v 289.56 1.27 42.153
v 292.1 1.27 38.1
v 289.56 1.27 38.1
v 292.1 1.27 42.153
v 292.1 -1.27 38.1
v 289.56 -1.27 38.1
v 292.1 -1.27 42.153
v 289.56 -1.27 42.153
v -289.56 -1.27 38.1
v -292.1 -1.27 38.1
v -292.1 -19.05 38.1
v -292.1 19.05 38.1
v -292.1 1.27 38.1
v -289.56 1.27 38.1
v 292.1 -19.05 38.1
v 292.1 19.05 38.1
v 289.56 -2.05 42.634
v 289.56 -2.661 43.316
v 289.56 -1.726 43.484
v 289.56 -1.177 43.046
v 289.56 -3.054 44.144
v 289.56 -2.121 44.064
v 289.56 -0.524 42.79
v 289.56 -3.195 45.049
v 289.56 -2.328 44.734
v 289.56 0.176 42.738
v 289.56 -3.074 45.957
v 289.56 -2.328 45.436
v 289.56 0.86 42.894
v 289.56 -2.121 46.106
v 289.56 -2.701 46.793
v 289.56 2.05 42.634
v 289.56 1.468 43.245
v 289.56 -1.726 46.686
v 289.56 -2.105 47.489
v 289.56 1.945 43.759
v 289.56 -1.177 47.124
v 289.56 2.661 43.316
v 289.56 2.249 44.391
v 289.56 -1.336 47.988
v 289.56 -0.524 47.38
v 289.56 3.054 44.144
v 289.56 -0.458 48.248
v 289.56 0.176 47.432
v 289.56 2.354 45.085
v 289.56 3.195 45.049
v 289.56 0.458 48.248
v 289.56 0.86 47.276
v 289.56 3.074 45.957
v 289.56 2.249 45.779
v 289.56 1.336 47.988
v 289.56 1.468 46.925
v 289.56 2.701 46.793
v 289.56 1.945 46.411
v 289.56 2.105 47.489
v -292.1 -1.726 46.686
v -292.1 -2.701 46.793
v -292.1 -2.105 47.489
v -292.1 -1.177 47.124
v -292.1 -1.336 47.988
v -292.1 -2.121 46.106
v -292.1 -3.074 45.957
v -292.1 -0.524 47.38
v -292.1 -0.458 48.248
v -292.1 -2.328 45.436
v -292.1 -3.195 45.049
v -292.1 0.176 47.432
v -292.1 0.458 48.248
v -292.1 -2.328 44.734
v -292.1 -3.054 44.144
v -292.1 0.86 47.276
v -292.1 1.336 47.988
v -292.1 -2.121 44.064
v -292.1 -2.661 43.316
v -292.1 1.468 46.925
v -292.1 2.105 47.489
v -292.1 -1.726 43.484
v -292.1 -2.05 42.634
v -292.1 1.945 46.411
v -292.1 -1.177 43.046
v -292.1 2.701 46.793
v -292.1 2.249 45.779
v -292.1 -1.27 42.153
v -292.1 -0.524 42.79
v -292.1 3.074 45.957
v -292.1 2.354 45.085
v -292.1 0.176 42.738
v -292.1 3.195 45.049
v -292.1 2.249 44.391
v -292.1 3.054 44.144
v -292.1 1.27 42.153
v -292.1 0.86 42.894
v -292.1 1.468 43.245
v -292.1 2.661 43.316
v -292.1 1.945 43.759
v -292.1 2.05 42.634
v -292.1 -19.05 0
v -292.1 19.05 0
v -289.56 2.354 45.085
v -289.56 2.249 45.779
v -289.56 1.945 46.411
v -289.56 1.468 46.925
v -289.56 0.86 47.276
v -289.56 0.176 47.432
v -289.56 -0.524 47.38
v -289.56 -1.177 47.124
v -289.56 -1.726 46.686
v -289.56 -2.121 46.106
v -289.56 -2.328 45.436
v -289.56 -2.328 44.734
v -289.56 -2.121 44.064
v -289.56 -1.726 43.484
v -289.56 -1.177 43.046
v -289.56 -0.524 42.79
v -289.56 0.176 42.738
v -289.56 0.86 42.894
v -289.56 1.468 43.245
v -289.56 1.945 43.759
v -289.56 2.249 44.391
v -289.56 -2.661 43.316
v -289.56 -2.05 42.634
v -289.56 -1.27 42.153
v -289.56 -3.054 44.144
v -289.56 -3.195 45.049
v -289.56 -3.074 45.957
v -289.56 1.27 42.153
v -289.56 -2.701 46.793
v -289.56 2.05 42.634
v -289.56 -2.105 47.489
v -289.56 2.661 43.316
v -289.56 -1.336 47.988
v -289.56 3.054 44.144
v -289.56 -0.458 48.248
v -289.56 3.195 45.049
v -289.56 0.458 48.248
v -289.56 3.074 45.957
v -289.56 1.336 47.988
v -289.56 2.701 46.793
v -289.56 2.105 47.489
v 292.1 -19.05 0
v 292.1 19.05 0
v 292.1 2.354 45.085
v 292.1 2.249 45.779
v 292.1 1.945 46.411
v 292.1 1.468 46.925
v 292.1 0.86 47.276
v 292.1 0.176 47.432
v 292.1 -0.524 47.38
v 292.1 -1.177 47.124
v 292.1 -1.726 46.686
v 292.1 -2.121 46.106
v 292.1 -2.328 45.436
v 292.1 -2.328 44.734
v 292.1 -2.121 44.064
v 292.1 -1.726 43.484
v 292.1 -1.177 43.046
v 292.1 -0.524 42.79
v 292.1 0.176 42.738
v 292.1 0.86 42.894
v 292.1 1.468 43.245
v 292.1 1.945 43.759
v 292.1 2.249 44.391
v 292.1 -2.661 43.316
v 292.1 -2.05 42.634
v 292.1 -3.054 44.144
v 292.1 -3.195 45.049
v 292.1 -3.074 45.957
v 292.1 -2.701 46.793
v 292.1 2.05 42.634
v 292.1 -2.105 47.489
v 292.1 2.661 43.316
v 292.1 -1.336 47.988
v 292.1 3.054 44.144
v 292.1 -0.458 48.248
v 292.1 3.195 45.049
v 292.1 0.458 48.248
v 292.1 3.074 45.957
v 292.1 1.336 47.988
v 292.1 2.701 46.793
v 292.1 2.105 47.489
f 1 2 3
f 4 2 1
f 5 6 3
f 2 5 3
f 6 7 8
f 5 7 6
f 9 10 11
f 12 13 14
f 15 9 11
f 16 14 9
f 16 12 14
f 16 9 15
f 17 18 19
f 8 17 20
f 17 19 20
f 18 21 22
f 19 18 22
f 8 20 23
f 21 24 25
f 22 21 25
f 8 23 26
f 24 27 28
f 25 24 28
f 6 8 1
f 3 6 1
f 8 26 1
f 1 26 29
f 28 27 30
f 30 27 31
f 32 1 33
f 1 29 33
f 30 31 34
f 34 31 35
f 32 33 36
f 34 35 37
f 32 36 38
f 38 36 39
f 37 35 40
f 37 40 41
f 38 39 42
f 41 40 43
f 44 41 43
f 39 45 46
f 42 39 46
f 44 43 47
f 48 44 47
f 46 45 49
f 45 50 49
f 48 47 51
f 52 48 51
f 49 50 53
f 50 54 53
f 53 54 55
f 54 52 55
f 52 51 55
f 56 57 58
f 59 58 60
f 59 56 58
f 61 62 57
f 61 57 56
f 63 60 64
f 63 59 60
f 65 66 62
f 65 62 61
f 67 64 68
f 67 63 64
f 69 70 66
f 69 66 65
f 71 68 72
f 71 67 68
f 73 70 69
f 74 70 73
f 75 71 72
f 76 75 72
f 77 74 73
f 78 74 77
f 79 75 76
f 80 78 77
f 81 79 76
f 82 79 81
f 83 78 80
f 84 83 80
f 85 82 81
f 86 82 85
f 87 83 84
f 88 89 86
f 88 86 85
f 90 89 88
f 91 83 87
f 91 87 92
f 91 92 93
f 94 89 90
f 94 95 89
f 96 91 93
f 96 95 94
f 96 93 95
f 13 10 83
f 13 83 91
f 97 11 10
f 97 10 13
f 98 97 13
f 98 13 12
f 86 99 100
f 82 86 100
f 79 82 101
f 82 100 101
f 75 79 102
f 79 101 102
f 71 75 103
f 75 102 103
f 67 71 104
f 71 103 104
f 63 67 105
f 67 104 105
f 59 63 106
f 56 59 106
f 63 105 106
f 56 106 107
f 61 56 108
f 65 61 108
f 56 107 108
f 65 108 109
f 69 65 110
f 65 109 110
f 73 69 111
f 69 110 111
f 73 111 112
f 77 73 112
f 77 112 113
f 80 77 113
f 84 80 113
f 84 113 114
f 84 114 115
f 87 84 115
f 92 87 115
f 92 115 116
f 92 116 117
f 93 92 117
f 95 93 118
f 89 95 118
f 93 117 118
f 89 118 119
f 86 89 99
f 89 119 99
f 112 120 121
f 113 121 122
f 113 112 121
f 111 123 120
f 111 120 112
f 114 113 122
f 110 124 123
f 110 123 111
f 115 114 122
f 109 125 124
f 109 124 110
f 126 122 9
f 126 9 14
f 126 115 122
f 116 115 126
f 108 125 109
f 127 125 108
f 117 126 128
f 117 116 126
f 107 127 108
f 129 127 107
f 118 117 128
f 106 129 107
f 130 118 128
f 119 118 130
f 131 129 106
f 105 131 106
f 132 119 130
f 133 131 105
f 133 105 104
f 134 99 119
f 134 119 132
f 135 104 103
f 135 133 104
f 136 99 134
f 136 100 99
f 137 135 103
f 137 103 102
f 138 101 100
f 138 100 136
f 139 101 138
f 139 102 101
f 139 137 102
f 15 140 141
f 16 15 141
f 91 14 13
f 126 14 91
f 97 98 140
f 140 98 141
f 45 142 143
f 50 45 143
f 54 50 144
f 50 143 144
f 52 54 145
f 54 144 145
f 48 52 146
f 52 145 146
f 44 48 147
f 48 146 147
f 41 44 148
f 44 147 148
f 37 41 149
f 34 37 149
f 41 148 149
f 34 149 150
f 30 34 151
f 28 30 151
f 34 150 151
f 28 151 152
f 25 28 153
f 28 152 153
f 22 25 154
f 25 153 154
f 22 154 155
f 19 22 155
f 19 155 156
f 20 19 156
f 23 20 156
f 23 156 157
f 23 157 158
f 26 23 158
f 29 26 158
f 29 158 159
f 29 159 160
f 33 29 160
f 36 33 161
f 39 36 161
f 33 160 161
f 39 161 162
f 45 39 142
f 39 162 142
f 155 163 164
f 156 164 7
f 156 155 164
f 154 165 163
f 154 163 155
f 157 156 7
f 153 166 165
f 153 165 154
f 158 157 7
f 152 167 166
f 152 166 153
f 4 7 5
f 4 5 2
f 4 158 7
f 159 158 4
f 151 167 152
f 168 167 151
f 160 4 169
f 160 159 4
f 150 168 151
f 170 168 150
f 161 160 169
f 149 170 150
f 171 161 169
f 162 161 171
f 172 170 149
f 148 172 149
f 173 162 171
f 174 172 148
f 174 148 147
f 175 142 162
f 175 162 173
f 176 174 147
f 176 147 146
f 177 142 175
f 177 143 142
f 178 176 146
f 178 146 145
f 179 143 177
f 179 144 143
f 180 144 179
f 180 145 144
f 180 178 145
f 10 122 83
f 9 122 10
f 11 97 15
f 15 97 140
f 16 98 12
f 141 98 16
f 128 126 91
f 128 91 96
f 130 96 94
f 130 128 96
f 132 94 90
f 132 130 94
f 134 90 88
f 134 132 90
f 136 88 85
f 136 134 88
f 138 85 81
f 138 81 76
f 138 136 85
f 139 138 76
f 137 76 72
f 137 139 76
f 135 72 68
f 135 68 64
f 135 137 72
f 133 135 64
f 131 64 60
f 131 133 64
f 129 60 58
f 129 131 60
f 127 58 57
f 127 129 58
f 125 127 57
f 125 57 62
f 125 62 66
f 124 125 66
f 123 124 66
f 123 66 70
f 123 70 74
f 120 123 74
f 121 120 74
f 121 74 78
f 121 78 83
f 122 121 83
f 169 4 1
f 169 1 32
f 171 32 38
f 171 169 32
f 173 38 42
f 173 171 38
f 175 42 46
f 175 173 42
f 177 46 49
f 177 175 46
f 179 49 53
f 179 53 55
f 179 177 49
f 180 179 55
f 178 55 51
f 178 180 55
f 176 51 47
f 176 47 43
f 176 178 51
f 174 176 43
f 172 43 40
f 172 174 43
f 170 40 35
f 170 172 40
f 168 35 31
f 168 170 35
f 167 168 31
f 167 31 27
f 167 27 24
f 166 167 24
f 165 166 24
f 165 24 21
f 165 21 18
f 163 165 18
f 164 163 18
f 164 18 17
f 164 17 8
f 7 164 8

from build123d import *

# Parameters (mm, degrees)
F0_W      = 584.2
F0_H      = 38.1
F1_DEPTH  = 38.1
F2_R      = 2.3539359474
F3_DEPTH  = 2.54
F4_START  = -581.66
F3_FACE_R = 2.3539359474
F4_DEPTH  = 2.54


with BuildPart() as f1:
    # F0 (on Top) → F1 (new body)
    with BuildSketch(Plane.XY):
        Rectangle(F0_W, F0_H)
    extrude(amount=F1_DEPTH)

    # F3_face (on face) → F4 (join)
    with BuildSketch(Plane(origin=(292.1, 0, 43.0586733638), x_dir=(0, 1, 0), z_dir=(1, 0, 0)).offset(F4_START)):
        with BuildLine():
            Line((-1.27, -0.9059671023), (-1.27, -4.9586733638))
            Line((-1.27, -4.9586733638), (1.27, -4.9586733638))
            Line((1.27, -4.9586733638), (1.27, -0.9059671023))
            ThreePointArc((1.27, -0.9059671023), (0, 5.2218307543), (-1.27, -0.9059671023))
        make_face()
        with Locations((0, 2.0263266362)):
            Circle(F3_FACE_R, mode=Mode.SUBTRACT)
    extrude(amount=-F4_DEPTH)


with BuildPart() as f3:
    # F2 (on face) → F3 (new body)
    with BuildSketch(Plane.YZ.offset(292.1)):
        with BuildLine():
            ThreePointArc((1.27, 42.1527062615), (0, 48.2805041181), (-1.27, 42.1527062615))
            Line((-1.27, 42.1527062615), (-1.27, 38.1))
            Line((-1.27, 38.1), (1.27, 38.1))
            Line((1.27, 38.1), (1.27, 42.1527062615))
        make_face()
        with Locations((0, 45.085)):
            Circle(F2_R, mode=Mode.SUBTRACT)
    extrude(amount=-F3_DEPTH)


solid = Compound([f1.part, f3.part])
